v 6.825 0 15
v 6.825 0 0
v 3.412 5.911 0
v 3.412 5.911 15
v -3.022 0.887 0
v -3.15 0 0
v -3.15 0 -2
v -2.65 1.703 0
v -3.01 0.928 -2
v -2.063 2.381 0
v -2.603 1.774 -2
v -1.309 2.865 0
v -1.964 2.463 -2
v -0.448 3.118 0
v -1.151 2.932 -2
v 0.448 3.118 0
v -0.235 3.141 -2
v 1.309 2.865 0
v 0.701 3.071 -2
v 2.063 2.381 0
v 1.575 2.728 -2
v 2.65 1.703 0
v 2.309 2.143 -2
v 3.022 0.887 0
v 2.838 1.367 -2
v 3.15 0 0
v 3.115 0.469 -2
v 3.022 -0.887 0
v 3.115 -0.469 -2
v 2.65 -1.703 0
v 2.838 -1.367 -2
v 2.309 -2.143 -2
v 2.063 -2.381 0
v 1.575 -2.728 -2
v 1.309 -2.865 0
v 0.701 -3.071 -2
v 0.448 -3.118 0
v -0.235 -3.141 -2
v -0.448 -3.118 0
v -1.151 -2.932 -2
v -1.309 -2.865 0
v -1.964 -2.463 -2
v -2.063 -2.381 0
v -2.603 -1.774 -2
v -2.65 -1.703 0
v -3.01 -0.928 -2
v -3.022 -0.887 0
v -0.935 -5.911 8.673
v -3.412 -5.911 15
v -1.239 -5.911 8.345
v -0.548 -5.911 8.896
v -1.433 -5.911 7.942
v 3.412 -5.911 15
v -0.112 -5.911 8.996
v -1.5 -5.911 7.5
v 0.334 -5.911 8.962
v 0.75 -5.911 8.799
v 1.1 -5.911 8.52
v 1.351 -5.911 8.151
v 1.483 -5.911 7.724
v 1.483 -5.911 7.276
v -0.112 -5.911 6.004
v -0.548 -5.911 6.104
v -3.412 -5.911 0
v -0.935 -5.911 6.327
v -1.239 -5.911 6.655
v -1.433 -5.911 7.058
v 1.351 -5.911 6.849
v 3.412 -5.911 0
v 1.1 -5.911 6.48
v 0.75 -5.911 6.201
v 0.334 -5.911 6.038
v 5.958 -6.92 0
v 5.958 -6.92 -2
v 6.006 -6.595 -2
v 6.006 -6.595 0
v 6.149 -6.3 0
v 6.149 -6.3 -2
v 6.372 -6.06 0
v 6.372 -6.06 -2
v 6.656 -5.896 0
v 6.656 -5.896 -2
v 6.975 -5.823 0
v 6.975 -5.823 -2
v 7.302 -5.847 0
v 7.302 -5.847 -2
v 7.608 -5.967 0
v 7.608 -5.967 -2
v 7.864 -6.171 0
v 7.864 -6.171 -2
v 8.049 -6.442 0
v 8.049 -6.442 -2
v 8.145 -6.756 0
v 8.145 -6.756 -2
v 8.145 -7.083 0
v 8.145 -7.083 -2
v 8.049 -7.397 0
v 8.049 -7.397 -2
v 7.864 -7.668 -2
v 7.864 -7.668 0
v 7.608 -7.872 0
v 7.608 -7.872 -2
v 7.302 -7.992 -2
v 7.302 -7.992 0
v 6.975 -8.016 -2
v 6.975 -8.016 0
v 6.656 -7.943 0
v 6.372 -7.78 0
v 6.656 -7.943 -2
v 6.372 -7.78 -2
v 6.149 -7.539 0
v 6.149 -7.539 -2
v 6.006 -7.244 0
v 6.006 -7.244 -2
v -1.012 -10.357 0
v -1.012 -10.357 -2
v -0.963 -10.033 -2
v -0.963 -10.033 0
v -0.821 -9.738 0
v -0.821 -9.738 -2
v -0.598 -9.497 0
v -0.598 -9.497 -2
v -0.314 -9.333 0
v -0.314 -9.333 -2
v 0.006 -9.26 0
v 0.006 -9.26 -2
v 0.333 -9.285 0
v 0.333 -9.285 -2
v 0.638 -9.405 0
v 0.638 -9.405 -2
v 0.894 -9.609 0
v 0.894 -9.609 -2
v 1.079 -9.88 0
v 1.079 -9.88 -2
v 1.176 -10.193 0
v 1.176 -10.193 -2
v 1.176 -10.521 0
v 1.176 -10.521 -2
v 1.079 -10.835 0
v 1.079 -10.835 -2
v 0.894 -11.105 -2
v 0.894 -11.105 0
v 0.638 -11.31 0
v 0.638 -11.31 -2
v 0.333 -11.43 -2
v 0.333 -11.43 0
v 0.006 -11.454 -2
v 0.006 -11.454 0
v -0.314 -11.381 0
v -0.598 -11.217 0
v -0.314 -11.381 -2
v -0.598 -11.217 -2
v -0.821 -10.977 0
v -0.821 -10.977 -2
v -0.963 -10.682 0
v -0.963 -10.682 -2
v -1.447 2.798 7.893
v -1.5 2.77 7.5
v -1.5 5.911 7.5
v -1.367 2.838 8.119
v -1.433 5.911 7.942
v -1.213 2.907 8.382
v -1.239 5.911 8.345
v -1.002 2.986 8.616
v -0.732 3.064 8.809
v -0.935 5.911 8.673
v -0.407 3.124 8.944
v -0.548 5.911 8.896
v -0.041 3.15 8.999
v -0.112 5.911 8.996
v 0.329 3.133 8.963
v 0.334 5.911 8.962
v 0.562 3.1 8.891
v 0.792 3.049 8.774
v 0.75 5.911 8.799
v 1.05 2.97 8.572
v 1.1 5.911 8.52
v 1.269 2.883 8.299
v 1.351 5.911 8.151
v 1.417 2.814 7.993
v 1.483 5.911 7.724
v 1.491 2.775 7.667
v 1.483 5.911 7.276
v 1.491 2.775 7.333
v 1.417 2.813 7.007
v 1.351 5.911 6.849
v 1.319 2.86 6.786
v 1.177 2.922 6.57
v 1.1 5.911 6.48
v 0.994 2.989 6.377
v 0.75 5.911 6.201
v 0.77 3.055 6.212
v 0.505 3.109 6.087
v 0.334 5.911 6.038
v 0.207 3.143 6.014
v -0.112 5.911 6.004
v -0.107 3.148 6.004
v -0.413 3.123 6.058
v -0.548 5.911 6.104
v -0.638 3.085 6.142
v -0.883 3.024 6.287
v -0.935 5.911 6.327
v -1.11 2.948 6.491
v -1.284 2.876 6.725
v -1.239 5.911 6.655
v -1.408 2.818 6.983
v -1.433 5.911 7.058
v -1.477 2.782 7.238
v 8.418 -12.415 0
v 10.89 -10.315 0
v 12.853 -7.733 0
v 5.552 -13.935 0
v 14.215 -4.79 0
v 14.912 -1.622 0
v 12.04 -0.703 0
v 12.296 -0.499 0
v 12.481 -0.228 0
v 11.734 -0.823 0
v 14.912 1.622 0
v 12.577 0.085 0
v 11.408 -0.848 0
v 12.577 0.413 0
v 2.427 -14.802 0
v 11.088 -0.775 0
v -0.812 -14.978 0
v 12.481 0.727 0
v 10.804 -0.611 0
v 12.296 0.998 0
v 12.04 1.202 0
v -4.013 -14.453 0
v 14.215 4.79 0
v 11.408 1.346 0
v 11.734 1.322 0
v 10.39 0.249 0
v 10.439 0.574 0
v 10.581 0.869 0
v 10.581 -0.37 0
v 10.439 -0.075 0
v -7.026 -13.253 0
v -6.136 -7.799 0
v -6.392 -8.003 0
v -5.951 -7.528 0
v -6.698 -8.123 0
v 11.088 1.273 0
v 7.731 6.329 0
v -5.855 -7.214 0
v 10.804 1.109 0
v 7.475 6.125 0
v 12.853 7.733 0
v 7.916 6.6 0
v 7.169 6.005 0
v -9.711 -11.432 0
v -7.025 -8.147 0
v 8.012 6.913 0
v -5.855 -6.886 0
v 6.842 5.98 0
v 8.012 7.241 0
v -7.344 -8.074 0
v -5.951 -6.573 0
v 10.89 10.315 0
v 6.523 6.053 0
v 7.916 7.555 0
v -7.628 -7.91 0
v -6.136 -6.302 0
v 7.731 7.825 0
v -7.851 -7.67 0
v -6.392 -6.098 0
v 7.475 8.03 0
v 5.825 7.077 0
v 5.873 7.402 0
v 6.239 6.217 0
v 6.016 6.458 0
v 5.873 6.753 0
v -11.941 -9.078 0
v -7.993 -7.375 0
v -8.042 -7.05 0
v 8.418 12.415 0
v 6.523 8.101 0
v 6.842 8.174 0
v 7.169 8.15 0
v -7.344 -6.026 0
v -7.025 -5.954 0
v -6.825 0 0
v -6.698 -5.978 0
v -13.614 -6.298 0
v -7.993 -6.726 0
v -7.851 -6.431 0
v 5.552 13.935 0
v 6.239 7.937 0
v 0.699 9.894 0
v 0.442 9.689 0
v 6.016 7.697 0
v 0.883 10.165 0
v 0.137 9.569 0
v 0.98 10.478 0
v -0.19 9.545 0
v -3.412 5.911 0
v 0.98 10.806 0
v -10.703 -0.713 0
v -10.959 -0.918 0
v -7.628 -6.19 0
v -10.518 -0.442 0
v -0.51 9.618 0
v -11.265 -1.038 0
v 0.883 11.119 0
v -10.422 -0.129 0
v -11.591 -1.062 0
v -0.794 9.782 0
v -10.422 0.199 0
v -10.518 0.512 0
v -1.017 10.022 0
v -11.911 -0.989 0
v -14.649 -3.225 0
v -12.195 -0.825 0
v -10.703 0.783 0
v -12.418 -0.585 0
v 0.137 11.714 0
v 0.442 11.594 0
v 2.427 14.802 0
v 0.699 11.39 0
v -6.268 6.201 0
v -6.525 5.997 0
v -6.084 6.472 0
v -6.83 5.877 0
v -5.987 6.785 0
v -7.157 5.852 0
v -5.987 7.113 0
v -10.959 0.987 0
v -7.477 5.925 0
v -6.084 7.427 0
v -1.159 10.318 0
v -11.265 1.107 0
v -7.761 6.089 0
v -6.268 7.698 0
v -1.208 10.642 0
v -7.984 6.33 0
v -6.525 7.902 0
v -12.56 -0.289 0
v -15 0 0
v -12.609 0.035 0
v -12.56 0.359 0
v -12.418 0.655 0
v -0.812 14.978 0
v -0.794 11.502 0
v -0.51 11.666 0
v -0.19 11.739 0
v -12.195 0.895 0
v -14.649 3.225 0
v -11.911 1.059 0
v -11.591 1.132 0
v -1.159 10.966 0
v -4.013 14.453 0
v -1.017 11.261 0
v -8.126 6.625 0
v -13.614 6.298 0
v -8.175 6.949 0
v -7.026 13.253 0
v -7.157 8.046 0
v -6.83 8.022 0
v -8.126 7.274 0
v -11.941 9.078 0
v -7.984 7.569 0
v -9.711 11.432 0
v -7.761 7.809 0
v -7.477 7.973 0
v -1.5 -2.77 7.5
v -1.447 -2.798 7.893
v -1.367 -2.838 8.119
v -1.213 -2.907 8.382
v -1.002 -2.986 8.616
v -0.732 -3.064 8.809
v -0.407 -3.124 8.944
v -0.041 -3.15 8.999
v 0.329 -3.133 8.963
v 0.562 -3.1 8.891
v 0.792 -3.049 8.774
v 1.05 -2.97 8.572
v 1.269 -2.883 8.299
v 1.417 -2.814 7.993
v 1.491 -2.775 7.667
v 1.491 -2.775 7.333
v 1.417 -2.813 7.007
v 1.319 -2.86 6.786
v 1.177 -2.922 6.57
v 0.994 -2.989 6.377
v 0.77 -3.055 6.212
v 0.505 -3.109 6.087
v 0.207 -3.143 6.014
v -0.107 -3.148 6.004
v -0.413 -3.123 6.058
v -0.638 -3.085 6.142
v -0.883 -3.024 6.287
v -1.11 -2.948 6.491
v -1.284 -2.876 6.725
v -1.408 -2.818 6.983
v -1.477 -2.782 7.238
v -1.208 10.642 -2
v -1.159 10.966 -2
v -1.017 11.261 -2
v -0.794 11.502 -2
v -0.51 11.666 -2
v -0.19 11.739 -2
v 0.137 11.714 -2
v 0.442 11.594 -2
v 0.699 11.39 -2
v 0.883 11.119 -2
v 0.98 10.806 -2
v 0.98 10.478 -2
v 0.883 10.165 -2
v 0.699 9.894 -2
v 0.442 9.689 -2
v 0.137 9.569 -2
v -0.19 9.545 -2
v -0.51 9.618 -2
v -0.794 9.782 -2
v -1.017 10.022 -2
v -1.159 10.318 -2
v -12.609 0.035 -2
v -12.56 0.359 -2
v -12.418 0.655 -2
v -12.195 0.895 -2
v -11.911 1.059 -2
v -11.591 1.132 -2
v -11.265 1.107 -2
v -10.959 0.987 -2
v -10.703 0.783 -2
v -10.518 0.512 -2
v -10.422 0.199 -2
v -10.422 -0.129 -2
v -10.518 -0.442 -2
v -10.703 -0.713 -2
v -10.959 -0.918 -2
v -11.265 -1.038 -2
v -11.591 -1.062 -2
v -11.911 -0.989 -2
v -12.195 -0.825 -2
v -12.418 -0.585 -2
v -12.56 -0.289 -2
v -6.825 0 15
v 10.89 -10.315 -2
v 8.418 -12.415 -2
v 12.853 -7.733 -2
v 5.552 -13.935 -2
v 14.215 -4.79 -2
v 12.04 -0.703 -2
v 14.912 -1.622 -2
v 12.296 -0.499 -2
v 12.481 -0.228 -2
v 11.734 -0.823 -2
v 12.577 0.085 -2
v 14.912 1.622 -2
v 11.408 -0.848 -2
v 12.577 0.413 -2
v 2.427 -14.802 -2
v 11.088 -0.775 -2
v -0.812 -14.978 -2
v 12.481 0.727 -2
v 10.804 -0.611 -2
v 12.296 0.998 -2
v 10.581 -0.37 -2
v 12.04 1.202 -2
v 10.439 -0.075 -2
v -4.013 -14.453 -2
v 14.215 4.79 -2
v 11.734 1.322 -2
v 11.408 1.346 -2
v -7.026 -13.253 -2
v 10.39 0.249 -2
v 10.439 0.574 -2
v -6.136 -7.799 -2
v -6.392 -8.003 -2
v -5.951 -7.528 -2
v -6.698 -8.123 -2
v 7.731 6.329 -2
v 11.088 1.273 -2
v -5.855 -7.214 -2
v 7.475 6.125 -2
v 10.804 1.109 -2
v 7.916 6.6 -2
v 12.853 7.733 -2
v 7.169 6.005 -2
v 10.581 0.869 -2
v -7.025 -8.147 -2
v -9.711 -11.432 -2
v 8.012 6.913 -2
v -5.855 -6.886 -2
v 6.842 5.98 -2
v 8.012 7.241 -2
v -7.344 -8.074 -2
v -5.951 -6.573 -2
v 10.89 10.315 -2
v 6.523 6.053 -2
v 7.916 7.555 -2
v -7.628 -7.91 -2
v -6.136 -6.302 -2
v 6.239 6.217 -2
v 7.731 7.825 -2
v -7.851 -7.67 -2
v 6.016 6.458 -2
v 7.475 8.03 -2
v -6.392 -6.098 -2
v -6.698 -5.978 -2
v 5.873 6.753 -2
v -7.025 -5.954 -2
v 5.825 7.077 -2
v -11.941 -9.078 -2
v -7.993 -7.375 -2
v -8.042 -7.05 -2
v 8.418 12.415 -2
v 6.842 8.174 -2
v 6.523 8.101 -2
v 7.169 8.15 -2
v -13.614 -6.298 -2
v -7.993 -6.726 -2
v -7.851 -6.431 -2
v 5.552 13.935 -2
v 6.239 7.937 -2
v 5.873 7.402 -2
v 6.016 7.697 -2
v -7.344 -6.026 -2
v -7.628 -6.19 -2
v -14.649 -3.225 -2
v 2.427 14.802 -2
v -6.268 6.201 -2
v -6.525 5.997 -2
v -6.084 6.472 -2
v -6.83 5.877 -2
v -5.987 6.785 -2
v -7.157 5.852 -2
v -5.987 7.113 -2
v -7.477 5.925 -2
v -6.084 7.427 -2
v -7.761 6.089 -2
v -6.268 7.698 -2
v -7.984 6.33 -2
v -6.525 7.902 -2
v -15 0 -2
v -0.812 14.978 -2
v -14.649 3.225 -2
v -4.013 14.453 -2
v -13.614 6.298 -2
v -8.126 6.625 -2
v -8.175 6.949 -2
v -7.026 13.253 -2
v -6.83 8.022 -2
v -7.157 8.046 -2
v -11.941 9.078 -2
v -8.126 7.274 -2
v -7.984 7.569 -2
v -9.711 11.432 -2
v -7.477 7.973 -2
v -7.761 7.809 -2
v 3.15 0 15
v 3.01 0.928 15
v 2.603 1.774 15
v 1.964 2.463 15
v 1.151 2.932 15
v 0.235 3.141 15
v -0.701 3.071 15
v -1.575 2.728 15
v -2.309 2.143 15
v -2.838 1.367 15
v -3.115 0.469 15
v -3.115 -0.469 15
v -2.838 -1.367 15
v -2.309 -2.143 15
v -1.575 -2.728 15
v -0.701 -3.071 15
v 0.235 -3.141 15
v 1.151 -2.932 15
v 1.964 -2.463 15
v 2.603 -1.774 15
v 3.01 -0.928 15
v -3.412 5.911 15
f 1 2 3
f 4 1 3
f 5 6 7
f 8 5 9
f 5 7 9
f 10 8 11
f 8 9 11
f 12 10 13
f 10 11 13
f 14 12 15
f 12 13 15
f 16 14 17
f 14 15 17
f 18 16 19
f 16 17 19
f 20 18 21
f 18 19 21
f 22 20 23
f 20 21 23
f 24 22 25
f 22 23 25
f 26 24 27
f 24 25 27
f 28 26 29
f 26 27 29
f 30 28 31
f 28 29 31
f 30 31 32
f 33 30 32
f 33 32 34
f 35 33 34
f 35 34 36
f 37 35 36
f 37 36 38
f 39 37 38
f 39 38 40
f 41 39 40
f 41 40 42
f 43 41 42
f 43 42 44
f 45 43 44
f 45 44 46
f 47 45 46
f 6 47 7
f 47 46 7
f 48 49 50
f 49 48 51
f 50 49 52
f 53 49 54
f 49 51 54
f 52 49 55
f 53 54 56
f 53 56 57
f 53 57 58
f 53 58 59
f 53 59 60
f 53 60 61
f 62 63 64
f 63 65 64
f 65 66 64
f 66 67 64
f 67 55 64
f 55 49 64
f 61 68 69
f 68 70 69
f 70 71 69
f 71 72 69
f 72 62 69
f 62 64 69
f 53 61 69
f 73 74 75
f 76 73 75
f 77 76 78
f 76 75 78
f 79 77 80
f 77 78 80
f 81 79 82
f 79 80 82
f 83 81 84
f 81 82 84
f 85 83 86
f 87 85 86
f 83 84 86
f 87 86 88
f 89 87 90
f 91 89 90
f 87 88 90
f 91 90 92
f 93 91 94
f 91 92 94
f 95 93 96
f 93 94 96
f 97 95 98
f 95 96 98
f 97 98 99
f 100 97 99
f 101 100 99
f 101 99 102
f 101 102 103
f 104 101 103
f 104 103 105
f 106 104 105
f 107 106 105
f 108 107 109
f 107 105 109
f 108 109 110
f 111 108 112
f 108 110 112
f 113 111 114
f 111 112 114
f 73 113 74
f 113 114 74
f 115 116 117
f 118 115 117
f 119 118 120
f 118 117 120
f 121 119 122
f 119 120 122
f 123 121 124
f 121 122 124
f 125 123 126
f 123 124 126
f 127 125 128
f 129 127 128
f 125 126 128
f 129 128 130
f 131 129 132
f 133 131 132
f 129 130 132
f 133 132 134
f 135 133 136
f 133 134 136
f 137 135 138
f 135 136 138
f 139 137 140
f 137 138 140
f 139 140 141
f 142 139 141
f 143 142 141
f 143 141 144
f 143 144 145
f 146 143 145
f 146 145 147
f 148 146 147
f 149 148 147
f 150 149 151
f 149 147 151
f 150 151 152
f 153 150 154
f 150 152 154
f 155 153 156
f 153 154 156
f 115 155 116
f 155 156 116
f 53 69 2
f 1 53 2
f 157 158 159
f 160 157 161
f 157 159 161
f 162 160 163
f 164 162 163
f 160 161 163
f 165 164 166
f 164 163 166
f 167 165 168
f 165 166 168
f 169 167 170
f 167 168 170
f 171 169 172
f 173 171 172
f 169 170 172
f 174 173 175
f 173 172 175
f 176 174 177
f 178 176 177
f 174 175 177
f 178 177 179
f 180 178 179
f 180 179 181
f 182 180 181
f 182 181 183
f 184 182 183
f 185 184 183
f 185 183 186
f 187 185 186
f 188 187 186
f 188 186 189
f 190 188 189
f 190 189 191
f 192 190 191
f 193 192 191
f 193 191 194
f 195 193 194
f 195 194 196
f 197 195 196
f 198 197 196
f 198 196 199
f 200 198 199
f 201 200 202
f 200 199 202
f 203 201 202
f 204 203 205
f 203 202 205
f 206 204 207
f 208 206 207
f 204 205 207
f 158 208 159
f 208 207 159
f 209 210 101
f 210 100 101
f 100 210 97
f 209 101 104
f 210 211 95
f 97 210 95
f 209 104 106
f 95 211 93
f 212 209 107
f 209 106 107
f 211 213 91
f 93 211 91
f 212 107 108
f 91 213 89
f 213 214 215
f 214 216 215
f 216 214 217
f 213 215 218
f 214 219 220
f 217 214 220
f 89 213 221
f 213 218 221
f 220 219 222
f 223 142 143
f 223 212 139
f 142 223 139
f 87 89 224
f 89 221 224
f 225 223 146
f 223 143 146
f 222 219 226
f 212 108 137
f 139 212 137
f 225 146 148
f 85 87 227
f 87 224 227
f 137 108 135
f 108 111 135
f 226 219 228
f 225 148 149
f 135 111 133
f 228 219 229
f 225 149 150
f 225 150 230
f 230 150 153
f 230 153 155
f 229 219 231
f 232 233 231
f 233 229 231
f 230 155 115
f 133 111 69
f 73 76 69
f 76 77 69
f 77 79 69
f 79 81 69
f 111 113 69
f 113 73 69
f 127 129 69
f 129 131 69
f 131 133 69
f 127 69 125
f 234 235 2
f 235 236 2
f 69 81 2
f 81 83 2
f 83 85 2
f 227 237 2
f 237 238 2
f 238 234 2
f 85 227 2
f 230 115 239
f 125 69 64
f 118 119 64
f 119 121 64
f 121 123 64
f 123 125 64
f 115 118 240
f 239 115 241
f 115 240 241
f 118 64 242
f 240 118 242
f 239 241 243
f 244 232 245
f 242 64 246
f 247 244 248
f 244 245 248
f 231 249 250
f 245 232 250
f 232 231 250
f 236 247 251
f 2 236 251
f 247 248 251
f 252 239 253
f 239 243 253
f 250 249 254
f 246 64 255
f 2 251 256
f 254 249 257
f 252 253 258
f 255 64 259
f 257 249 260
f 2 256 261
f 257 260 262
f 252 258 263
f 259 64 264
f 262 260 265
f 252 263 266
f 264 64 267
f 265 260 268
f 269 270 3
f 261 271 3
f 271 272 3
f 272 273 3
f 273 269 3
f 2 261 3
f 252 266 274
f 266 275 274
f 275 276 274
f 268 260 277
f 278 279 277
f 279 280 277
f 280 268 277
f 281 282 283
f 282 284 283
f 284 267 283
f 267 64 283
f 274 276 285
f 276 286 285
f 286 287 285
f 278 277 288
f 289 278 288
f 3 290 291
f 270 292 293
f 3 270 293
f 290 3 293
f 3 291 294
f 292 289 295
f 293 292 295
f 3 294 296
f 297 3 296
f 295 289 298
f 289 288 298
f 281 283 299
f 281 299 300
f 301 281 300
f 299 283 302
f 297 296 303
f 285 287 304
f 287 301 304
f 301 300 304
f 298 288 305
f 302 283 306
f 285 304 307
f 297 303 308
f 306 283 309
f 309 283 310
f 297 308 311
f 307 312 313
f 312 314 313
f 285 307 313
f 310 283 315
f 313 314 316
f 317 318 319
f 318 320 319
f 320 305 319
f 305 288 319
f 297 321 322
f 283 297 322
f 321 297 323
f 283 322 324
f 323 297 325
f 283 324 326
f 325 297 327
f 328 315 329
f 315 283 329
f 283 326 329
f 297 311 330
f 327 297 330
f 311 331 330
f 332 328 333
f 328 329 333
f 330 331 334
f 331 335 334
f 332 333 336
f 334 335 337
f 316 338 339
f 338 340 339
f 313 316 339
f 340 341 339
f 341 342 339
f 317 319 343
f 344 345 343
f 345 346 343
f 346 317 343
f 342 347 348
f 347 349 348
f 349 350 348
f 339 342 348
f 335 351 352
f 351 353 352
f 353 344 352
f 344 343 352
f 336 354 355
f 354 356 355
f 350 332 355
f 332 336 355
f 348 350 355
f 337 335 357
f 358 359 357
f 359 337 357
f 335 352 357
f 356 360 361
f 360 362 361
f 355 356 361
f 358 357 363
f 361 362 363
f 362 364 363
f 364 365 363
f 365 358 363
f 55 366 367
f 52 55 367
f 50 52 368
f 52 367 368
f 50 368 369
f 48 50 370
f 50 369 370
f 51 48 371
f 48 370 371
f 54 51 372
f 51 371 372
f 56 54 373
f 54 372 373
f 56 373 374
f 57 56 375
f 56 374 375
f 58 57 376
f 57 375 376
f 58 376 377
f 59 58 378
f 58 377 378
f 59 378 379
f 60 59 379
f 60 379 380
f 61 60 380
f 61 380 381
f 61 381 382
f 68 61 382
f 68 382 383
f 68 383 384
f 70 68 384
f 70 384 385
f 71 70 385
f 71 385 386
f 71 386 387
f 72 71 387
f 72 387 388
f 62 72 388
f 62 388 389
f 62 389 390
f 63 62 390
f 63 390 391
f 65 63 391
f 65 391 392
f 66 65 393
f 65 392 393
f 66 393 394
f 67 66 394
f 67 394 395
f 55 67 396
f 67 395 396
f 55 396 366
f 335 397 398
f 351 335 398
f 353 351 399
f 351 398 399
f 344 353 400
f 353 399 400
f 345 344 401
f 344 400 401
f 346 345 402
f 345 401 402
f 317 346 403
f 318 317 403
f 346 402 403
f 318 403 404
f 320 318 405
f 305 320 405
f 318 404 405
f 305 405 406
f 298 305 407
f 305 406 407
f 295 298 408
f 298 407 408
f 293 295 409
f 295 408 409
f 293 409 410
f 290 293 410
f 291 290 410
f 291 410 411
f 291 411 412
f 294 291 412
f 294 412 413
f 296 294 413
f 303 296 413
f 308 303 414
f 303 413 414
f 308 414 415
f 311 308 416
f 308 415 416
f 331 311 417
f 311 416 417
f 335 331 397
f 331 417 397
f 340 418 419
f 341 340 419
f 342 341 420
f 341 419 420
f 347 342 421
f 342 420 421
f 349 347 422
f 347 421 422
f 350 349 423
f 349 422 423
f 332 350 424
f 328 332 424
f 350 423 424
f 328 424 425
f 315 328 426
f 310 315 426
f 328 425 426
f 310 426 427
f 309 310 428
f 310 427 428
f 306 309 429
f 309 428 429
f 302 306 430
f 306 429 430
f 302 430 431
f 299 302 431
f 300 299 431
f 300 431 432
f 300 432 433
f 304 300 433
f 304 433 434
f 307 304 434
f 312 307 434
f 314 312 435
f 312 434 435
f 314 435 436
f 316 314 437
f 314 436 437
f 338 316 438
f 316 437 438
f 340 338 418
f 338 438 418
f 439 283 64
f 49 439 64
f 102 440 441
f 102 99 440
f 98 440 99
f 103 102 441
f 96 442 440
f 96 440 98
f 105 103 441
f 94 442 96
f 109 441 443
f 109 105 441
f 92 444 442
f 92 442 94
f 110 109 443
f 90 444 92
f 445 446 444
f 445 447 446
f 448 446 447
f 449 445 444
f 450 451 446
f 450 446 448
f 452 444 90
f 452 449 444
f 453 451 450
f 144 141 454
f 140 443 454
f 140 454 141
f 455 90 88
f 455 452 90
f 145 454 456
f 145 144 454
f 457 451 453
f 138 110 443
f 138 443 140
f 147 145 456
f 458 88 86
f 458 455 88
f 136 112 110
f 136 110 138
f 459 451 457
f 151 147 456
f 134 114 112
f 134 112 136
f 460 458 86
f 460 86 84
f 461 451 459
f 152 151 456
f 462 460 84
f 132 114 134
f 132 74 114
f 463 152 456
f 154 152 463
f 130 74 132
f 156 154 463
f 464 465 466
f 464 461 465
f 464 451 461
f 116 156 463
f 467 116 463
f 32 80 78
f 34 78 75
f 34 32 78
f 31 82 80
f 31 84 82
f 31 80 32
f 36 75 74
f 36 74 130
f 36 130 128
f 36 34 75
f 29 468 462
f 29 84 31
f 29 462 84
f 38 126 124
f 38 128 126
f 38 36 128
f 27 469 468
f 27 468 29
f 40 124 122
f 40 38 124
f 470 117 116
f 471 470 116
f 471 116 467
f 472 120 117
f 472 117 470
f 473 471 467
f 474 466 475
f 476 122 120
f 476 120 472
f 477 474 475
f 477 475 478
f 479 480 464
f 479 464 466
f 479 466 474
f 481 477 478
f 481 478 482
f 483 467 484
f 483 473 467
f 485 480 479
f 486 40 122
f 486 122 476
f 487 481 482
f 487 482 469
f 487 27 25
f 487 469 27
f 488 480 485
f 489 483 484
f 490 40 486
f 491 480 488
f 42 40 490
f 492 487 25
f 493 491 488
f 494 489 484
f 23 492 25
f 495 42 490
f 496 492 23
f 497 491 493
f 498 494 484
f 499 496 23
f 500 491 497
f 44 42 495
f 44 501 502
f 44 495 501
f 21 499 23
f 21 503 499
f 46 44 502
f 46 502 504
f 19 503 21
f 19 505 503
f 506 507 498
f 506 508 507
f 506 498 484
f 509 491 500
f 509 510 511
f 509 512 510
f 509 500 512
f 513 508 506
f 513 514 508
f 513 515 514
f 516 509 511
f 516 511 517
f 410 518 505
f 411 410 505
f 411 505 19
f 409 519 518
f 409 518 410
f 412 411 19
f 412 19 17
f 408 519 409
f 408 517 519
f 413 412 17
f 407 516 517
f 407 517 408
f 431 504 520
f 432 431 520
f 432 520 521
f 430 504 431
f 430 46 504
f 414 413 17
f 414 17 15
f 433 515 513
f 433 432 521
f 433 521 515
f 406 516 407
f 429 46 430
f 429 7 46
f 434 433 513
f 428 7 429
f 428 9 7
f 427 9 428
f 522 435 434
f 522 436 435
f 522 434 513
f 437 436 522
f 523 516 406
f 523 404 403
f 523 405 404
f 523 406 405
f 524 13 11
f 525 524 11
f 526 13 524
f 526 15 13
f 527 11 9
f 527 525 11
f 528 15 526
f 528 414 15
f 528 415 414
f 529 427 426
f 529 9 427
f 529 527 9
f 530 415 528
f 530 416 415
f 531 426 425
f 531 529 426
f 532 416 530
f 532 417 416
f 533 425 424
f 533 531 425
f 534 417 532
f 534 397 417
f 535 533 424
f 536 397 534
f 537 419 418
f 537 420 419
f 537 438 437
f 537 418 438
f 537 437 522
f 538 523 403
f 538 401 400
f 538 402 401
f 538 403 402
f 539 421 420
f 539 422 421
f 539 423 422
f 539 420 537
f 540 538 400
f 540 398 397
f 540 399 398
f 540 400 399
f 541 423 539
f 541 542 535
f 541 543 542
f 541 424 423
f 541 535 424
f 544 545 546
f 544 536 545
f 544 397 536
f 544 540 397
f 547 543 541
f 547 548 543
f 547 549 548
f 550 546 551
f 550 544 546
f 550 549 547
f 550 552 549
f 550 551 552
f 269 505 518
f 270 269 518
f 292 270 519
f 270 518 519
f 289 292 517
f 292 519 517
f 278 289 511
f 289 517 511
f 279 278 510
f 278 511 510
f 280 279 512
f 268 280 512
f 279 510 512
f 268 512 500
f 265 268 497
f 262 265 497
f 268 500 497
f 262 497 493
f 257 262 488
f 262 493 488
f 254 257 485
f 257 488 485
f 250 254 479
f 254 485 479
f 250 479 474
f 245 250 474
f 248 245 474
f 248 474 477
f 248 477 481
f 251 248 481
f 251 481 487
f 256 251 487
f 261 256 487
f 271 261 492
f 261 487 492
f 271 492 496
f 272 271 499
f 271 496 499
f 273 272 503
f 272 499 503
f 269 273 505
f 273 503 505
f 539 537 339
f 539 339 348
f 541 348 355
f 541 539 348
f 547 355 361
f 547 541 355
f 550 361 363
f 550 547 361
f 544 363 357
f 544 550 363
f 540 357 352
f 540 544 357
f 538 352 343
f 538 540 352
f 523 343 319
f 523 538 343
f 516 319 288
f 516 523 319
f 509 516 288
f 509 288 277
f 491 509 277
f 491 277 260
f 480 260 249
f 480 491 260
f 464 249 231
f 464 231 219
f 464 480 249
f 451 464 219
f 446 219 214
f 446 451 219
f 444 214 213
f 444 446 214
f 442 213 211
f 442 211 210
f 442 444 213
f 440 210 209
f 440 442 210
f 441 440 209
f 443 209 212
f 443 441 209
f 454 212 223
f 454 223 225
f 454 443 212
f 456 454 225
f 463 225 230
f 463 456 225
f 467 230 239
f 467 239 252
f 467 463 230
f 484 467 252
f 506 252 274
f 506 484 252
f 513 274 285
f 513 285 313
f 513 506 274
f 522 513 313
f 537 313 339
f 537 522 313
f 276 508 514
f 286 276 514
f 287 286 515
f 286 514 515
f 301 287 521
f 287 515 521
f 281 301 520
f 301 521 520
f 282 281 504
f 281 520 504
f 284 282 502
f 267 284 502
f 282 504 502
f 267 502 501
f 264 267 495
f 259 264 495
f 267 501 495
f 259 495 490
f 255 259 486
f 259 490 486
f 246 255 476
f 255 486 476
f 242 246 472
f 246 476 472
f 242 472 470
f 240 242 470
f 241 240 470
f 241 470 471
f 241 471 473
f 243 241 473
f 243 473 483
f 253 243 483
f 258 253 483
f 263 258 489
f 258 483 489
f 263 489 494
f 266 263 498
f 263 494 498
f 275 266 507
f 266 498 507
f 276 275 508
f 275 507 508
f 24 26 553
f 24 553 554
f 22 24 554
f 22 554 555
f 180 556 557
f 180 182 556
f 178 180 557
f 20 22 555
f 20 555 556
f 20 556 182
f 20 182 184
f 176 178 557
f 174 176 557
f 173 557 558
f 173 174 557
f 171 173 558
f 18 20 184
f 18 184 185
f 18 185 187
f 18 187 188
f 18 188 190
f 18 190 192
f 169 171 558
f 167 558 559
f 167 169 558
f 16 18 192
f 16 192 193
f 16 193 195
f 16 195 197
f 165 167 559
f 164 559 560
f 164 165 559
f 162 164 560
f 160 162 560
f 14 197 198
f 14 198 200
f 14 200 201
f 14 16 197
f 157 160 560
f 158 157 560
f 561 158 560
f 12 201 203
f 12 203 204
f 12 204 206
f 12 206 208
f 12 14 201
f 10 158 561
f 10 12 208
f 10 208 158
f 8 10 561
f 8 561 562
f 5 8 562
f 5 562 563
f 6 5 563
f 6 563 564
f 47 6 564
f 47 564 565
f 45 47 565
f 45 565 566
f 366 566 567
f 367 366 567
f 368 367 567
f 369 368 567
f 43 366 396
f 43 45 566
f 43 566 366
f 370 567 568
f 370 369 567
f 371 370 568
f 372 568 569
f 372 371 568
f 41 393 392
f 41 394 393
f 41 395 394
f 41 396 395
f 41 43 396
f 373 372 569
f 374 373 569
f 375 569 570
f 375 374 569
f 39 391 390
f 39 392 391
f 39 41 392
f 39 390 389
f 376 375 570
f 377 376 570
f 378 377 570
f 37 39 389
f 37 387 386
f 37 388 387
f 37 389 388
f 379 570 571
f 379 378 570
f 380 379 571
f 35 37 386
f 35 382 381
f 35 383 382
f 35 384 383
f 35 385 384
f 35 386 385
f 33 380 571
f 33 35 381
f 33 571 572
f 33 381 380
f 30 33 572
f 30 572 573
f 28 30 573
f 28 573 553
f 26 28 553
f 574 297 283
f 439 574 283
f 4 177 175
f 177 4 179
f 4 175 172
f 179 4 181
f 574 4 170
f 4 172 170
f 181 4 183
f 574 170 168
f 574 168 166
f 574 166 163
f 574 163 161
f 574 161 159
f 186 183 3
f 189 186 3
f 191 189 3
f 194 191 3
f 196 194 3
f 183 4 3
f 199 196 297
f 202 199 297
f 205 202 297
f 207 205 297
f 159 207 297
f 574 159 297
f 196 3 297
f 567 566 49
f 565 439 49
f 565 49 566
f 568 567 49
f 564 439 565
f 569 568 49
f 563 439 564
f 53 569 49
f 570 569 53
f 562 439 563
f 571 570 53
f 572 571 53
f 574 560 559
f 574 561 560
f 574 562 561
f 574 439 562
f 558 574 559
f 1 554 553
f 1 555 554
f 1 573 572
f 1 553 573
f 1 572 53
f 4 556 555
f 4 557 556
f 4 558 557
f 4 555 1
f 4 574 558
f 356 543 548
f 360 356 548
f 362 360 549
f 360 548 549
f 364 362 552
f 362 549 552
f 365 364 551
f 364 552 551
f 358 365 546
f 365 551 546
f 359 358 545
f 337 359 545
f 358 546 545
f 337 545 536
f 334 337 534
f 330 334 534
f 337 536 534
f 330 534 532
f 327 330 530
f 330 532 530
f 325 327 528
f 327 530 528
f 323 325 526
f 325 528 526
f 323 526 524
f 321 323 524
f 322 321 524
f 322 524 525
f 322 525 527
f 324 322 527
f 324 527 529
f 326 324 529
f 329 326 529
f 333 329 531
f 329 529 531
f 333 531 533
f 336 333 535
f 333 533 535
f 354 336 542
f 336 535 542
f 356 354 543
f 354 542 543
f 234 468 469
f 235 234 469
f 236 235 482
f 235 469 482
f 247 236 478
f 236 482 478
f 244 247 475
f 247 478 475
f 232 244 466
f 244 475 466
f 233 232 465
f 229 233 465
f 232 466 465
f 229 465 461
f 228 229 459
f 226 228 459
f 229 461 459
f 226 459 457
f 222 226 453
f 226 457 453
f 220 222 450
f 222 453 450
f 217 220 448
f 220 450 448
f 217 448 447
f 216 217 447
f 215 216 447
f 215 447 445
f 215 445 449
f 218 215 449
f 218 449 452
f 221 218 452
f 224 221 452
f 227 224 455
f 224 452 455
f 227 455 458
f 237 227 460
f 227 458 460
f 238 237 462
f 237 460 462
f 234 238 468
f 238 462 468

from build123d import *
from build123d.topology import SkipClean

# Parameters (mm, degrees)
SKETCH_1_R          = 3.15
EXTRUDE_1_DEPTH     = 15
EXTRUDE_START       = 2
SKETCH_2_R          = 15
SKETCH_2_R_2        = 3.15
SKETCH_2_R_3        = 1.1
EXTRUDE_2_DEPTH     = 2
SKETCH_3_R          = 1.5
CUT_EXTRUDE_1_DEPTH = 30.786812018


with BuildPart() as part:
    # 草图1 → 凸台-拉伸1 (new body)
    with BuildSketch(Plane.XY):
        Polygon((-3.4125, -5.910623381), (3.4125, -5.910623381), (6.825, 0), (3.4125, 5.910623381), (-3.4125, 5.910623381), (-6.825, 0), align=None)
        Circle(SKETCH_1_R, mode=Mode.SUBTRACT)
    extrude(amount=EXTRUDE_1_DEPTH)

    # 草图2 → 凸台-拉伸2 (add)
    with SkipClean():  # the faces are left unmerged after this step: merging them gives an invalid solid
        with BuildSketch(Plane(origin=(0, 0, 0), x_dir=(-1, 0, 0), z_dir=(0, 0, -1)).offset(EXTRUDE_START)):
            Circle(SKETCH_2_R)
            Circle(SKETCH_2_R_2, mode=Mode.SUBTRACT)
            with Locations((0.107841154, 10.641777672)):
                Circle(SKETCH_2_R_3, mode=Mode.SUBTRACT)
            with Locations((7.074701484, 6.949367968)):
                Circle(SKETCH_2_R_3, mode=Mode.SUBTRACT)
            with Locations((11.509282596, 0.034851677)):
                Circle(SKETCH_2_R_3, mode=Mode.SUBTRACT)
            with Locations((6.942357889, -7.050434427)):
                Circle(SKETCH_2_R_3, mode=Mode.SUBTRACT)
            with Locations((-0.08801923, -10.357308944)):
                Circle(SKETCH_2_R_3, mode=Mode.SUBTRACT)
            with Locations((-7.057604111, -6.919535443)):
                Circle(SKETCH_2_R_3, mode=Mode.SUBTRACT)
            with Locations((-11.489717031, 0.24936543)):
                Circle(SKETCH_2_R_3, mode=Mode.SUBTRACT)
            with Locations((-6.924524538, 7.077286558)):
                Circle(SKETCH_2_R_3, mode=Mode.SUBTRACT)
        extrude(amount=-EXTRUDE_2_DEPTH)

    # 草图3 → 切除-拉伸1 (cut, through all)
    with SkipClean():  # the faces are left unmerged after this step: merging them gives an invalid solid
        with BuildSketch(Plane(origin=(0, 5.910623381, 0), x_dir=(1, 0, 0), z_dir=(0, 1, 0))):
            with Locations(Location((0, -7.5, 0), (0, 0, 180))):
                Circle(SKETCH_3_R)
        extrude(amount=-CUT_EXTRUDE_1_DEPTH, mode=Mode.SUBTRACT)


solid = part.part
